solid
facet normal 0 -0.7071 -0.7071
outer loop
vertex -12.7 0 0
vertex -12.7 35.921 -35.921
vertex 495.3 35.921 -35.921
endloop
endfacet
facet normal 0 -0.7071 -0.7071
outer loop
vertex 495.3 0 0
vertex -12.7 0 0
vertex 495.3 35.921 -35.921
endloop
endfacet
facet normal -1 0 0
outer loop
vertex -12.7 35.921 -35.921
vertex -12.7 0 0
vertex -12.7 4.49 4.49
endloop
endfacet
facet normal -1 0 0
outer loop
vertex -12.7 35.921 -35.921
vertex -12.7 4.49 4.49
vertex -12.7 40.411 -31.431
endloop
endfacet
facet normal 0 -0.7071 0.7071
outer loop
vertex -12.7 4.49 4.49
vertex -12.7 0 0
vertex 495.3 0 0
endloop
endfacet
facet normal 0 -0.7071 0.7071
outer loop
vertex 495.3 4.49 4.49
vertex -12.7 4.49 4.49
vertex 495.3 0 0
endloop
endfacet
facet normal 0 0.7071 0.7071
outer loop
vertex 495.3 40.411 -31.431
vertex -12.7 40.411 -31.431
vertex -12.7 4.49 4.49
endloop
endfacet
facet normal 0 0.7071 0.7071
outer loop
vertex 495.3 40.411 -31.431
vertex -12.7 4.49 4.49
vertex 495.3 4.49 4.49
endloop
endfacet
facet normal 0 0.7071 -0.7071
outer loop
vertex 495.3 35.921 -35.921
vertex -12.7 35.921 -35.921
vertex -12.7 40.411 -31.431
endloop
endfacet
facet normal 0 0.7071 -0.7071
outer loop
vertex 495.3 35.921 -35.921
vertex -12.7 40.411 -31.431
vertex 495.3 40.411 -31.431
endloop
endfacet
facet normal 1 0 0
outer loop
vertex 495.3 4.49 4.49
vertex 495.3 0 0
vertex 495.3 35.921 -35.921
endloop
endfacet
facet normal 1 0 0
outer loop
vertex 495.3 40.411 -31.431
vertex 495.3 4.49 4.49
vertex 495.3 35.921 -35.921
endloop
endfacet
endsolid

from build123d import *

# Parameters (mm, degrees)
BOX_W          = 508
BOX_H          = 50.8
BOX_DEPTH      = 6.35
BOX_ROLL_ANGLE = -45


with BuildPart() as part:
    # Box → Box (new body)
    with BuildSketch(Plane.XY):
        with Locations((254, 25.4)):
            Rectangle(BOX_W, BOX_H)
    extrude(amount=BOX_DEPTH)


with BuildPart() as part_1:
    # Box roll: moved
    add(part.part.rotate(Axis((0, 0, 0), (1, 0, 0)), BOX_ROLL_ANGLE))


with BuildPart() as part_2:
    # Box placement: moved
    add(part_1.part.moved(Location((-12.7, 0, 0))))


solid = part_2.part
